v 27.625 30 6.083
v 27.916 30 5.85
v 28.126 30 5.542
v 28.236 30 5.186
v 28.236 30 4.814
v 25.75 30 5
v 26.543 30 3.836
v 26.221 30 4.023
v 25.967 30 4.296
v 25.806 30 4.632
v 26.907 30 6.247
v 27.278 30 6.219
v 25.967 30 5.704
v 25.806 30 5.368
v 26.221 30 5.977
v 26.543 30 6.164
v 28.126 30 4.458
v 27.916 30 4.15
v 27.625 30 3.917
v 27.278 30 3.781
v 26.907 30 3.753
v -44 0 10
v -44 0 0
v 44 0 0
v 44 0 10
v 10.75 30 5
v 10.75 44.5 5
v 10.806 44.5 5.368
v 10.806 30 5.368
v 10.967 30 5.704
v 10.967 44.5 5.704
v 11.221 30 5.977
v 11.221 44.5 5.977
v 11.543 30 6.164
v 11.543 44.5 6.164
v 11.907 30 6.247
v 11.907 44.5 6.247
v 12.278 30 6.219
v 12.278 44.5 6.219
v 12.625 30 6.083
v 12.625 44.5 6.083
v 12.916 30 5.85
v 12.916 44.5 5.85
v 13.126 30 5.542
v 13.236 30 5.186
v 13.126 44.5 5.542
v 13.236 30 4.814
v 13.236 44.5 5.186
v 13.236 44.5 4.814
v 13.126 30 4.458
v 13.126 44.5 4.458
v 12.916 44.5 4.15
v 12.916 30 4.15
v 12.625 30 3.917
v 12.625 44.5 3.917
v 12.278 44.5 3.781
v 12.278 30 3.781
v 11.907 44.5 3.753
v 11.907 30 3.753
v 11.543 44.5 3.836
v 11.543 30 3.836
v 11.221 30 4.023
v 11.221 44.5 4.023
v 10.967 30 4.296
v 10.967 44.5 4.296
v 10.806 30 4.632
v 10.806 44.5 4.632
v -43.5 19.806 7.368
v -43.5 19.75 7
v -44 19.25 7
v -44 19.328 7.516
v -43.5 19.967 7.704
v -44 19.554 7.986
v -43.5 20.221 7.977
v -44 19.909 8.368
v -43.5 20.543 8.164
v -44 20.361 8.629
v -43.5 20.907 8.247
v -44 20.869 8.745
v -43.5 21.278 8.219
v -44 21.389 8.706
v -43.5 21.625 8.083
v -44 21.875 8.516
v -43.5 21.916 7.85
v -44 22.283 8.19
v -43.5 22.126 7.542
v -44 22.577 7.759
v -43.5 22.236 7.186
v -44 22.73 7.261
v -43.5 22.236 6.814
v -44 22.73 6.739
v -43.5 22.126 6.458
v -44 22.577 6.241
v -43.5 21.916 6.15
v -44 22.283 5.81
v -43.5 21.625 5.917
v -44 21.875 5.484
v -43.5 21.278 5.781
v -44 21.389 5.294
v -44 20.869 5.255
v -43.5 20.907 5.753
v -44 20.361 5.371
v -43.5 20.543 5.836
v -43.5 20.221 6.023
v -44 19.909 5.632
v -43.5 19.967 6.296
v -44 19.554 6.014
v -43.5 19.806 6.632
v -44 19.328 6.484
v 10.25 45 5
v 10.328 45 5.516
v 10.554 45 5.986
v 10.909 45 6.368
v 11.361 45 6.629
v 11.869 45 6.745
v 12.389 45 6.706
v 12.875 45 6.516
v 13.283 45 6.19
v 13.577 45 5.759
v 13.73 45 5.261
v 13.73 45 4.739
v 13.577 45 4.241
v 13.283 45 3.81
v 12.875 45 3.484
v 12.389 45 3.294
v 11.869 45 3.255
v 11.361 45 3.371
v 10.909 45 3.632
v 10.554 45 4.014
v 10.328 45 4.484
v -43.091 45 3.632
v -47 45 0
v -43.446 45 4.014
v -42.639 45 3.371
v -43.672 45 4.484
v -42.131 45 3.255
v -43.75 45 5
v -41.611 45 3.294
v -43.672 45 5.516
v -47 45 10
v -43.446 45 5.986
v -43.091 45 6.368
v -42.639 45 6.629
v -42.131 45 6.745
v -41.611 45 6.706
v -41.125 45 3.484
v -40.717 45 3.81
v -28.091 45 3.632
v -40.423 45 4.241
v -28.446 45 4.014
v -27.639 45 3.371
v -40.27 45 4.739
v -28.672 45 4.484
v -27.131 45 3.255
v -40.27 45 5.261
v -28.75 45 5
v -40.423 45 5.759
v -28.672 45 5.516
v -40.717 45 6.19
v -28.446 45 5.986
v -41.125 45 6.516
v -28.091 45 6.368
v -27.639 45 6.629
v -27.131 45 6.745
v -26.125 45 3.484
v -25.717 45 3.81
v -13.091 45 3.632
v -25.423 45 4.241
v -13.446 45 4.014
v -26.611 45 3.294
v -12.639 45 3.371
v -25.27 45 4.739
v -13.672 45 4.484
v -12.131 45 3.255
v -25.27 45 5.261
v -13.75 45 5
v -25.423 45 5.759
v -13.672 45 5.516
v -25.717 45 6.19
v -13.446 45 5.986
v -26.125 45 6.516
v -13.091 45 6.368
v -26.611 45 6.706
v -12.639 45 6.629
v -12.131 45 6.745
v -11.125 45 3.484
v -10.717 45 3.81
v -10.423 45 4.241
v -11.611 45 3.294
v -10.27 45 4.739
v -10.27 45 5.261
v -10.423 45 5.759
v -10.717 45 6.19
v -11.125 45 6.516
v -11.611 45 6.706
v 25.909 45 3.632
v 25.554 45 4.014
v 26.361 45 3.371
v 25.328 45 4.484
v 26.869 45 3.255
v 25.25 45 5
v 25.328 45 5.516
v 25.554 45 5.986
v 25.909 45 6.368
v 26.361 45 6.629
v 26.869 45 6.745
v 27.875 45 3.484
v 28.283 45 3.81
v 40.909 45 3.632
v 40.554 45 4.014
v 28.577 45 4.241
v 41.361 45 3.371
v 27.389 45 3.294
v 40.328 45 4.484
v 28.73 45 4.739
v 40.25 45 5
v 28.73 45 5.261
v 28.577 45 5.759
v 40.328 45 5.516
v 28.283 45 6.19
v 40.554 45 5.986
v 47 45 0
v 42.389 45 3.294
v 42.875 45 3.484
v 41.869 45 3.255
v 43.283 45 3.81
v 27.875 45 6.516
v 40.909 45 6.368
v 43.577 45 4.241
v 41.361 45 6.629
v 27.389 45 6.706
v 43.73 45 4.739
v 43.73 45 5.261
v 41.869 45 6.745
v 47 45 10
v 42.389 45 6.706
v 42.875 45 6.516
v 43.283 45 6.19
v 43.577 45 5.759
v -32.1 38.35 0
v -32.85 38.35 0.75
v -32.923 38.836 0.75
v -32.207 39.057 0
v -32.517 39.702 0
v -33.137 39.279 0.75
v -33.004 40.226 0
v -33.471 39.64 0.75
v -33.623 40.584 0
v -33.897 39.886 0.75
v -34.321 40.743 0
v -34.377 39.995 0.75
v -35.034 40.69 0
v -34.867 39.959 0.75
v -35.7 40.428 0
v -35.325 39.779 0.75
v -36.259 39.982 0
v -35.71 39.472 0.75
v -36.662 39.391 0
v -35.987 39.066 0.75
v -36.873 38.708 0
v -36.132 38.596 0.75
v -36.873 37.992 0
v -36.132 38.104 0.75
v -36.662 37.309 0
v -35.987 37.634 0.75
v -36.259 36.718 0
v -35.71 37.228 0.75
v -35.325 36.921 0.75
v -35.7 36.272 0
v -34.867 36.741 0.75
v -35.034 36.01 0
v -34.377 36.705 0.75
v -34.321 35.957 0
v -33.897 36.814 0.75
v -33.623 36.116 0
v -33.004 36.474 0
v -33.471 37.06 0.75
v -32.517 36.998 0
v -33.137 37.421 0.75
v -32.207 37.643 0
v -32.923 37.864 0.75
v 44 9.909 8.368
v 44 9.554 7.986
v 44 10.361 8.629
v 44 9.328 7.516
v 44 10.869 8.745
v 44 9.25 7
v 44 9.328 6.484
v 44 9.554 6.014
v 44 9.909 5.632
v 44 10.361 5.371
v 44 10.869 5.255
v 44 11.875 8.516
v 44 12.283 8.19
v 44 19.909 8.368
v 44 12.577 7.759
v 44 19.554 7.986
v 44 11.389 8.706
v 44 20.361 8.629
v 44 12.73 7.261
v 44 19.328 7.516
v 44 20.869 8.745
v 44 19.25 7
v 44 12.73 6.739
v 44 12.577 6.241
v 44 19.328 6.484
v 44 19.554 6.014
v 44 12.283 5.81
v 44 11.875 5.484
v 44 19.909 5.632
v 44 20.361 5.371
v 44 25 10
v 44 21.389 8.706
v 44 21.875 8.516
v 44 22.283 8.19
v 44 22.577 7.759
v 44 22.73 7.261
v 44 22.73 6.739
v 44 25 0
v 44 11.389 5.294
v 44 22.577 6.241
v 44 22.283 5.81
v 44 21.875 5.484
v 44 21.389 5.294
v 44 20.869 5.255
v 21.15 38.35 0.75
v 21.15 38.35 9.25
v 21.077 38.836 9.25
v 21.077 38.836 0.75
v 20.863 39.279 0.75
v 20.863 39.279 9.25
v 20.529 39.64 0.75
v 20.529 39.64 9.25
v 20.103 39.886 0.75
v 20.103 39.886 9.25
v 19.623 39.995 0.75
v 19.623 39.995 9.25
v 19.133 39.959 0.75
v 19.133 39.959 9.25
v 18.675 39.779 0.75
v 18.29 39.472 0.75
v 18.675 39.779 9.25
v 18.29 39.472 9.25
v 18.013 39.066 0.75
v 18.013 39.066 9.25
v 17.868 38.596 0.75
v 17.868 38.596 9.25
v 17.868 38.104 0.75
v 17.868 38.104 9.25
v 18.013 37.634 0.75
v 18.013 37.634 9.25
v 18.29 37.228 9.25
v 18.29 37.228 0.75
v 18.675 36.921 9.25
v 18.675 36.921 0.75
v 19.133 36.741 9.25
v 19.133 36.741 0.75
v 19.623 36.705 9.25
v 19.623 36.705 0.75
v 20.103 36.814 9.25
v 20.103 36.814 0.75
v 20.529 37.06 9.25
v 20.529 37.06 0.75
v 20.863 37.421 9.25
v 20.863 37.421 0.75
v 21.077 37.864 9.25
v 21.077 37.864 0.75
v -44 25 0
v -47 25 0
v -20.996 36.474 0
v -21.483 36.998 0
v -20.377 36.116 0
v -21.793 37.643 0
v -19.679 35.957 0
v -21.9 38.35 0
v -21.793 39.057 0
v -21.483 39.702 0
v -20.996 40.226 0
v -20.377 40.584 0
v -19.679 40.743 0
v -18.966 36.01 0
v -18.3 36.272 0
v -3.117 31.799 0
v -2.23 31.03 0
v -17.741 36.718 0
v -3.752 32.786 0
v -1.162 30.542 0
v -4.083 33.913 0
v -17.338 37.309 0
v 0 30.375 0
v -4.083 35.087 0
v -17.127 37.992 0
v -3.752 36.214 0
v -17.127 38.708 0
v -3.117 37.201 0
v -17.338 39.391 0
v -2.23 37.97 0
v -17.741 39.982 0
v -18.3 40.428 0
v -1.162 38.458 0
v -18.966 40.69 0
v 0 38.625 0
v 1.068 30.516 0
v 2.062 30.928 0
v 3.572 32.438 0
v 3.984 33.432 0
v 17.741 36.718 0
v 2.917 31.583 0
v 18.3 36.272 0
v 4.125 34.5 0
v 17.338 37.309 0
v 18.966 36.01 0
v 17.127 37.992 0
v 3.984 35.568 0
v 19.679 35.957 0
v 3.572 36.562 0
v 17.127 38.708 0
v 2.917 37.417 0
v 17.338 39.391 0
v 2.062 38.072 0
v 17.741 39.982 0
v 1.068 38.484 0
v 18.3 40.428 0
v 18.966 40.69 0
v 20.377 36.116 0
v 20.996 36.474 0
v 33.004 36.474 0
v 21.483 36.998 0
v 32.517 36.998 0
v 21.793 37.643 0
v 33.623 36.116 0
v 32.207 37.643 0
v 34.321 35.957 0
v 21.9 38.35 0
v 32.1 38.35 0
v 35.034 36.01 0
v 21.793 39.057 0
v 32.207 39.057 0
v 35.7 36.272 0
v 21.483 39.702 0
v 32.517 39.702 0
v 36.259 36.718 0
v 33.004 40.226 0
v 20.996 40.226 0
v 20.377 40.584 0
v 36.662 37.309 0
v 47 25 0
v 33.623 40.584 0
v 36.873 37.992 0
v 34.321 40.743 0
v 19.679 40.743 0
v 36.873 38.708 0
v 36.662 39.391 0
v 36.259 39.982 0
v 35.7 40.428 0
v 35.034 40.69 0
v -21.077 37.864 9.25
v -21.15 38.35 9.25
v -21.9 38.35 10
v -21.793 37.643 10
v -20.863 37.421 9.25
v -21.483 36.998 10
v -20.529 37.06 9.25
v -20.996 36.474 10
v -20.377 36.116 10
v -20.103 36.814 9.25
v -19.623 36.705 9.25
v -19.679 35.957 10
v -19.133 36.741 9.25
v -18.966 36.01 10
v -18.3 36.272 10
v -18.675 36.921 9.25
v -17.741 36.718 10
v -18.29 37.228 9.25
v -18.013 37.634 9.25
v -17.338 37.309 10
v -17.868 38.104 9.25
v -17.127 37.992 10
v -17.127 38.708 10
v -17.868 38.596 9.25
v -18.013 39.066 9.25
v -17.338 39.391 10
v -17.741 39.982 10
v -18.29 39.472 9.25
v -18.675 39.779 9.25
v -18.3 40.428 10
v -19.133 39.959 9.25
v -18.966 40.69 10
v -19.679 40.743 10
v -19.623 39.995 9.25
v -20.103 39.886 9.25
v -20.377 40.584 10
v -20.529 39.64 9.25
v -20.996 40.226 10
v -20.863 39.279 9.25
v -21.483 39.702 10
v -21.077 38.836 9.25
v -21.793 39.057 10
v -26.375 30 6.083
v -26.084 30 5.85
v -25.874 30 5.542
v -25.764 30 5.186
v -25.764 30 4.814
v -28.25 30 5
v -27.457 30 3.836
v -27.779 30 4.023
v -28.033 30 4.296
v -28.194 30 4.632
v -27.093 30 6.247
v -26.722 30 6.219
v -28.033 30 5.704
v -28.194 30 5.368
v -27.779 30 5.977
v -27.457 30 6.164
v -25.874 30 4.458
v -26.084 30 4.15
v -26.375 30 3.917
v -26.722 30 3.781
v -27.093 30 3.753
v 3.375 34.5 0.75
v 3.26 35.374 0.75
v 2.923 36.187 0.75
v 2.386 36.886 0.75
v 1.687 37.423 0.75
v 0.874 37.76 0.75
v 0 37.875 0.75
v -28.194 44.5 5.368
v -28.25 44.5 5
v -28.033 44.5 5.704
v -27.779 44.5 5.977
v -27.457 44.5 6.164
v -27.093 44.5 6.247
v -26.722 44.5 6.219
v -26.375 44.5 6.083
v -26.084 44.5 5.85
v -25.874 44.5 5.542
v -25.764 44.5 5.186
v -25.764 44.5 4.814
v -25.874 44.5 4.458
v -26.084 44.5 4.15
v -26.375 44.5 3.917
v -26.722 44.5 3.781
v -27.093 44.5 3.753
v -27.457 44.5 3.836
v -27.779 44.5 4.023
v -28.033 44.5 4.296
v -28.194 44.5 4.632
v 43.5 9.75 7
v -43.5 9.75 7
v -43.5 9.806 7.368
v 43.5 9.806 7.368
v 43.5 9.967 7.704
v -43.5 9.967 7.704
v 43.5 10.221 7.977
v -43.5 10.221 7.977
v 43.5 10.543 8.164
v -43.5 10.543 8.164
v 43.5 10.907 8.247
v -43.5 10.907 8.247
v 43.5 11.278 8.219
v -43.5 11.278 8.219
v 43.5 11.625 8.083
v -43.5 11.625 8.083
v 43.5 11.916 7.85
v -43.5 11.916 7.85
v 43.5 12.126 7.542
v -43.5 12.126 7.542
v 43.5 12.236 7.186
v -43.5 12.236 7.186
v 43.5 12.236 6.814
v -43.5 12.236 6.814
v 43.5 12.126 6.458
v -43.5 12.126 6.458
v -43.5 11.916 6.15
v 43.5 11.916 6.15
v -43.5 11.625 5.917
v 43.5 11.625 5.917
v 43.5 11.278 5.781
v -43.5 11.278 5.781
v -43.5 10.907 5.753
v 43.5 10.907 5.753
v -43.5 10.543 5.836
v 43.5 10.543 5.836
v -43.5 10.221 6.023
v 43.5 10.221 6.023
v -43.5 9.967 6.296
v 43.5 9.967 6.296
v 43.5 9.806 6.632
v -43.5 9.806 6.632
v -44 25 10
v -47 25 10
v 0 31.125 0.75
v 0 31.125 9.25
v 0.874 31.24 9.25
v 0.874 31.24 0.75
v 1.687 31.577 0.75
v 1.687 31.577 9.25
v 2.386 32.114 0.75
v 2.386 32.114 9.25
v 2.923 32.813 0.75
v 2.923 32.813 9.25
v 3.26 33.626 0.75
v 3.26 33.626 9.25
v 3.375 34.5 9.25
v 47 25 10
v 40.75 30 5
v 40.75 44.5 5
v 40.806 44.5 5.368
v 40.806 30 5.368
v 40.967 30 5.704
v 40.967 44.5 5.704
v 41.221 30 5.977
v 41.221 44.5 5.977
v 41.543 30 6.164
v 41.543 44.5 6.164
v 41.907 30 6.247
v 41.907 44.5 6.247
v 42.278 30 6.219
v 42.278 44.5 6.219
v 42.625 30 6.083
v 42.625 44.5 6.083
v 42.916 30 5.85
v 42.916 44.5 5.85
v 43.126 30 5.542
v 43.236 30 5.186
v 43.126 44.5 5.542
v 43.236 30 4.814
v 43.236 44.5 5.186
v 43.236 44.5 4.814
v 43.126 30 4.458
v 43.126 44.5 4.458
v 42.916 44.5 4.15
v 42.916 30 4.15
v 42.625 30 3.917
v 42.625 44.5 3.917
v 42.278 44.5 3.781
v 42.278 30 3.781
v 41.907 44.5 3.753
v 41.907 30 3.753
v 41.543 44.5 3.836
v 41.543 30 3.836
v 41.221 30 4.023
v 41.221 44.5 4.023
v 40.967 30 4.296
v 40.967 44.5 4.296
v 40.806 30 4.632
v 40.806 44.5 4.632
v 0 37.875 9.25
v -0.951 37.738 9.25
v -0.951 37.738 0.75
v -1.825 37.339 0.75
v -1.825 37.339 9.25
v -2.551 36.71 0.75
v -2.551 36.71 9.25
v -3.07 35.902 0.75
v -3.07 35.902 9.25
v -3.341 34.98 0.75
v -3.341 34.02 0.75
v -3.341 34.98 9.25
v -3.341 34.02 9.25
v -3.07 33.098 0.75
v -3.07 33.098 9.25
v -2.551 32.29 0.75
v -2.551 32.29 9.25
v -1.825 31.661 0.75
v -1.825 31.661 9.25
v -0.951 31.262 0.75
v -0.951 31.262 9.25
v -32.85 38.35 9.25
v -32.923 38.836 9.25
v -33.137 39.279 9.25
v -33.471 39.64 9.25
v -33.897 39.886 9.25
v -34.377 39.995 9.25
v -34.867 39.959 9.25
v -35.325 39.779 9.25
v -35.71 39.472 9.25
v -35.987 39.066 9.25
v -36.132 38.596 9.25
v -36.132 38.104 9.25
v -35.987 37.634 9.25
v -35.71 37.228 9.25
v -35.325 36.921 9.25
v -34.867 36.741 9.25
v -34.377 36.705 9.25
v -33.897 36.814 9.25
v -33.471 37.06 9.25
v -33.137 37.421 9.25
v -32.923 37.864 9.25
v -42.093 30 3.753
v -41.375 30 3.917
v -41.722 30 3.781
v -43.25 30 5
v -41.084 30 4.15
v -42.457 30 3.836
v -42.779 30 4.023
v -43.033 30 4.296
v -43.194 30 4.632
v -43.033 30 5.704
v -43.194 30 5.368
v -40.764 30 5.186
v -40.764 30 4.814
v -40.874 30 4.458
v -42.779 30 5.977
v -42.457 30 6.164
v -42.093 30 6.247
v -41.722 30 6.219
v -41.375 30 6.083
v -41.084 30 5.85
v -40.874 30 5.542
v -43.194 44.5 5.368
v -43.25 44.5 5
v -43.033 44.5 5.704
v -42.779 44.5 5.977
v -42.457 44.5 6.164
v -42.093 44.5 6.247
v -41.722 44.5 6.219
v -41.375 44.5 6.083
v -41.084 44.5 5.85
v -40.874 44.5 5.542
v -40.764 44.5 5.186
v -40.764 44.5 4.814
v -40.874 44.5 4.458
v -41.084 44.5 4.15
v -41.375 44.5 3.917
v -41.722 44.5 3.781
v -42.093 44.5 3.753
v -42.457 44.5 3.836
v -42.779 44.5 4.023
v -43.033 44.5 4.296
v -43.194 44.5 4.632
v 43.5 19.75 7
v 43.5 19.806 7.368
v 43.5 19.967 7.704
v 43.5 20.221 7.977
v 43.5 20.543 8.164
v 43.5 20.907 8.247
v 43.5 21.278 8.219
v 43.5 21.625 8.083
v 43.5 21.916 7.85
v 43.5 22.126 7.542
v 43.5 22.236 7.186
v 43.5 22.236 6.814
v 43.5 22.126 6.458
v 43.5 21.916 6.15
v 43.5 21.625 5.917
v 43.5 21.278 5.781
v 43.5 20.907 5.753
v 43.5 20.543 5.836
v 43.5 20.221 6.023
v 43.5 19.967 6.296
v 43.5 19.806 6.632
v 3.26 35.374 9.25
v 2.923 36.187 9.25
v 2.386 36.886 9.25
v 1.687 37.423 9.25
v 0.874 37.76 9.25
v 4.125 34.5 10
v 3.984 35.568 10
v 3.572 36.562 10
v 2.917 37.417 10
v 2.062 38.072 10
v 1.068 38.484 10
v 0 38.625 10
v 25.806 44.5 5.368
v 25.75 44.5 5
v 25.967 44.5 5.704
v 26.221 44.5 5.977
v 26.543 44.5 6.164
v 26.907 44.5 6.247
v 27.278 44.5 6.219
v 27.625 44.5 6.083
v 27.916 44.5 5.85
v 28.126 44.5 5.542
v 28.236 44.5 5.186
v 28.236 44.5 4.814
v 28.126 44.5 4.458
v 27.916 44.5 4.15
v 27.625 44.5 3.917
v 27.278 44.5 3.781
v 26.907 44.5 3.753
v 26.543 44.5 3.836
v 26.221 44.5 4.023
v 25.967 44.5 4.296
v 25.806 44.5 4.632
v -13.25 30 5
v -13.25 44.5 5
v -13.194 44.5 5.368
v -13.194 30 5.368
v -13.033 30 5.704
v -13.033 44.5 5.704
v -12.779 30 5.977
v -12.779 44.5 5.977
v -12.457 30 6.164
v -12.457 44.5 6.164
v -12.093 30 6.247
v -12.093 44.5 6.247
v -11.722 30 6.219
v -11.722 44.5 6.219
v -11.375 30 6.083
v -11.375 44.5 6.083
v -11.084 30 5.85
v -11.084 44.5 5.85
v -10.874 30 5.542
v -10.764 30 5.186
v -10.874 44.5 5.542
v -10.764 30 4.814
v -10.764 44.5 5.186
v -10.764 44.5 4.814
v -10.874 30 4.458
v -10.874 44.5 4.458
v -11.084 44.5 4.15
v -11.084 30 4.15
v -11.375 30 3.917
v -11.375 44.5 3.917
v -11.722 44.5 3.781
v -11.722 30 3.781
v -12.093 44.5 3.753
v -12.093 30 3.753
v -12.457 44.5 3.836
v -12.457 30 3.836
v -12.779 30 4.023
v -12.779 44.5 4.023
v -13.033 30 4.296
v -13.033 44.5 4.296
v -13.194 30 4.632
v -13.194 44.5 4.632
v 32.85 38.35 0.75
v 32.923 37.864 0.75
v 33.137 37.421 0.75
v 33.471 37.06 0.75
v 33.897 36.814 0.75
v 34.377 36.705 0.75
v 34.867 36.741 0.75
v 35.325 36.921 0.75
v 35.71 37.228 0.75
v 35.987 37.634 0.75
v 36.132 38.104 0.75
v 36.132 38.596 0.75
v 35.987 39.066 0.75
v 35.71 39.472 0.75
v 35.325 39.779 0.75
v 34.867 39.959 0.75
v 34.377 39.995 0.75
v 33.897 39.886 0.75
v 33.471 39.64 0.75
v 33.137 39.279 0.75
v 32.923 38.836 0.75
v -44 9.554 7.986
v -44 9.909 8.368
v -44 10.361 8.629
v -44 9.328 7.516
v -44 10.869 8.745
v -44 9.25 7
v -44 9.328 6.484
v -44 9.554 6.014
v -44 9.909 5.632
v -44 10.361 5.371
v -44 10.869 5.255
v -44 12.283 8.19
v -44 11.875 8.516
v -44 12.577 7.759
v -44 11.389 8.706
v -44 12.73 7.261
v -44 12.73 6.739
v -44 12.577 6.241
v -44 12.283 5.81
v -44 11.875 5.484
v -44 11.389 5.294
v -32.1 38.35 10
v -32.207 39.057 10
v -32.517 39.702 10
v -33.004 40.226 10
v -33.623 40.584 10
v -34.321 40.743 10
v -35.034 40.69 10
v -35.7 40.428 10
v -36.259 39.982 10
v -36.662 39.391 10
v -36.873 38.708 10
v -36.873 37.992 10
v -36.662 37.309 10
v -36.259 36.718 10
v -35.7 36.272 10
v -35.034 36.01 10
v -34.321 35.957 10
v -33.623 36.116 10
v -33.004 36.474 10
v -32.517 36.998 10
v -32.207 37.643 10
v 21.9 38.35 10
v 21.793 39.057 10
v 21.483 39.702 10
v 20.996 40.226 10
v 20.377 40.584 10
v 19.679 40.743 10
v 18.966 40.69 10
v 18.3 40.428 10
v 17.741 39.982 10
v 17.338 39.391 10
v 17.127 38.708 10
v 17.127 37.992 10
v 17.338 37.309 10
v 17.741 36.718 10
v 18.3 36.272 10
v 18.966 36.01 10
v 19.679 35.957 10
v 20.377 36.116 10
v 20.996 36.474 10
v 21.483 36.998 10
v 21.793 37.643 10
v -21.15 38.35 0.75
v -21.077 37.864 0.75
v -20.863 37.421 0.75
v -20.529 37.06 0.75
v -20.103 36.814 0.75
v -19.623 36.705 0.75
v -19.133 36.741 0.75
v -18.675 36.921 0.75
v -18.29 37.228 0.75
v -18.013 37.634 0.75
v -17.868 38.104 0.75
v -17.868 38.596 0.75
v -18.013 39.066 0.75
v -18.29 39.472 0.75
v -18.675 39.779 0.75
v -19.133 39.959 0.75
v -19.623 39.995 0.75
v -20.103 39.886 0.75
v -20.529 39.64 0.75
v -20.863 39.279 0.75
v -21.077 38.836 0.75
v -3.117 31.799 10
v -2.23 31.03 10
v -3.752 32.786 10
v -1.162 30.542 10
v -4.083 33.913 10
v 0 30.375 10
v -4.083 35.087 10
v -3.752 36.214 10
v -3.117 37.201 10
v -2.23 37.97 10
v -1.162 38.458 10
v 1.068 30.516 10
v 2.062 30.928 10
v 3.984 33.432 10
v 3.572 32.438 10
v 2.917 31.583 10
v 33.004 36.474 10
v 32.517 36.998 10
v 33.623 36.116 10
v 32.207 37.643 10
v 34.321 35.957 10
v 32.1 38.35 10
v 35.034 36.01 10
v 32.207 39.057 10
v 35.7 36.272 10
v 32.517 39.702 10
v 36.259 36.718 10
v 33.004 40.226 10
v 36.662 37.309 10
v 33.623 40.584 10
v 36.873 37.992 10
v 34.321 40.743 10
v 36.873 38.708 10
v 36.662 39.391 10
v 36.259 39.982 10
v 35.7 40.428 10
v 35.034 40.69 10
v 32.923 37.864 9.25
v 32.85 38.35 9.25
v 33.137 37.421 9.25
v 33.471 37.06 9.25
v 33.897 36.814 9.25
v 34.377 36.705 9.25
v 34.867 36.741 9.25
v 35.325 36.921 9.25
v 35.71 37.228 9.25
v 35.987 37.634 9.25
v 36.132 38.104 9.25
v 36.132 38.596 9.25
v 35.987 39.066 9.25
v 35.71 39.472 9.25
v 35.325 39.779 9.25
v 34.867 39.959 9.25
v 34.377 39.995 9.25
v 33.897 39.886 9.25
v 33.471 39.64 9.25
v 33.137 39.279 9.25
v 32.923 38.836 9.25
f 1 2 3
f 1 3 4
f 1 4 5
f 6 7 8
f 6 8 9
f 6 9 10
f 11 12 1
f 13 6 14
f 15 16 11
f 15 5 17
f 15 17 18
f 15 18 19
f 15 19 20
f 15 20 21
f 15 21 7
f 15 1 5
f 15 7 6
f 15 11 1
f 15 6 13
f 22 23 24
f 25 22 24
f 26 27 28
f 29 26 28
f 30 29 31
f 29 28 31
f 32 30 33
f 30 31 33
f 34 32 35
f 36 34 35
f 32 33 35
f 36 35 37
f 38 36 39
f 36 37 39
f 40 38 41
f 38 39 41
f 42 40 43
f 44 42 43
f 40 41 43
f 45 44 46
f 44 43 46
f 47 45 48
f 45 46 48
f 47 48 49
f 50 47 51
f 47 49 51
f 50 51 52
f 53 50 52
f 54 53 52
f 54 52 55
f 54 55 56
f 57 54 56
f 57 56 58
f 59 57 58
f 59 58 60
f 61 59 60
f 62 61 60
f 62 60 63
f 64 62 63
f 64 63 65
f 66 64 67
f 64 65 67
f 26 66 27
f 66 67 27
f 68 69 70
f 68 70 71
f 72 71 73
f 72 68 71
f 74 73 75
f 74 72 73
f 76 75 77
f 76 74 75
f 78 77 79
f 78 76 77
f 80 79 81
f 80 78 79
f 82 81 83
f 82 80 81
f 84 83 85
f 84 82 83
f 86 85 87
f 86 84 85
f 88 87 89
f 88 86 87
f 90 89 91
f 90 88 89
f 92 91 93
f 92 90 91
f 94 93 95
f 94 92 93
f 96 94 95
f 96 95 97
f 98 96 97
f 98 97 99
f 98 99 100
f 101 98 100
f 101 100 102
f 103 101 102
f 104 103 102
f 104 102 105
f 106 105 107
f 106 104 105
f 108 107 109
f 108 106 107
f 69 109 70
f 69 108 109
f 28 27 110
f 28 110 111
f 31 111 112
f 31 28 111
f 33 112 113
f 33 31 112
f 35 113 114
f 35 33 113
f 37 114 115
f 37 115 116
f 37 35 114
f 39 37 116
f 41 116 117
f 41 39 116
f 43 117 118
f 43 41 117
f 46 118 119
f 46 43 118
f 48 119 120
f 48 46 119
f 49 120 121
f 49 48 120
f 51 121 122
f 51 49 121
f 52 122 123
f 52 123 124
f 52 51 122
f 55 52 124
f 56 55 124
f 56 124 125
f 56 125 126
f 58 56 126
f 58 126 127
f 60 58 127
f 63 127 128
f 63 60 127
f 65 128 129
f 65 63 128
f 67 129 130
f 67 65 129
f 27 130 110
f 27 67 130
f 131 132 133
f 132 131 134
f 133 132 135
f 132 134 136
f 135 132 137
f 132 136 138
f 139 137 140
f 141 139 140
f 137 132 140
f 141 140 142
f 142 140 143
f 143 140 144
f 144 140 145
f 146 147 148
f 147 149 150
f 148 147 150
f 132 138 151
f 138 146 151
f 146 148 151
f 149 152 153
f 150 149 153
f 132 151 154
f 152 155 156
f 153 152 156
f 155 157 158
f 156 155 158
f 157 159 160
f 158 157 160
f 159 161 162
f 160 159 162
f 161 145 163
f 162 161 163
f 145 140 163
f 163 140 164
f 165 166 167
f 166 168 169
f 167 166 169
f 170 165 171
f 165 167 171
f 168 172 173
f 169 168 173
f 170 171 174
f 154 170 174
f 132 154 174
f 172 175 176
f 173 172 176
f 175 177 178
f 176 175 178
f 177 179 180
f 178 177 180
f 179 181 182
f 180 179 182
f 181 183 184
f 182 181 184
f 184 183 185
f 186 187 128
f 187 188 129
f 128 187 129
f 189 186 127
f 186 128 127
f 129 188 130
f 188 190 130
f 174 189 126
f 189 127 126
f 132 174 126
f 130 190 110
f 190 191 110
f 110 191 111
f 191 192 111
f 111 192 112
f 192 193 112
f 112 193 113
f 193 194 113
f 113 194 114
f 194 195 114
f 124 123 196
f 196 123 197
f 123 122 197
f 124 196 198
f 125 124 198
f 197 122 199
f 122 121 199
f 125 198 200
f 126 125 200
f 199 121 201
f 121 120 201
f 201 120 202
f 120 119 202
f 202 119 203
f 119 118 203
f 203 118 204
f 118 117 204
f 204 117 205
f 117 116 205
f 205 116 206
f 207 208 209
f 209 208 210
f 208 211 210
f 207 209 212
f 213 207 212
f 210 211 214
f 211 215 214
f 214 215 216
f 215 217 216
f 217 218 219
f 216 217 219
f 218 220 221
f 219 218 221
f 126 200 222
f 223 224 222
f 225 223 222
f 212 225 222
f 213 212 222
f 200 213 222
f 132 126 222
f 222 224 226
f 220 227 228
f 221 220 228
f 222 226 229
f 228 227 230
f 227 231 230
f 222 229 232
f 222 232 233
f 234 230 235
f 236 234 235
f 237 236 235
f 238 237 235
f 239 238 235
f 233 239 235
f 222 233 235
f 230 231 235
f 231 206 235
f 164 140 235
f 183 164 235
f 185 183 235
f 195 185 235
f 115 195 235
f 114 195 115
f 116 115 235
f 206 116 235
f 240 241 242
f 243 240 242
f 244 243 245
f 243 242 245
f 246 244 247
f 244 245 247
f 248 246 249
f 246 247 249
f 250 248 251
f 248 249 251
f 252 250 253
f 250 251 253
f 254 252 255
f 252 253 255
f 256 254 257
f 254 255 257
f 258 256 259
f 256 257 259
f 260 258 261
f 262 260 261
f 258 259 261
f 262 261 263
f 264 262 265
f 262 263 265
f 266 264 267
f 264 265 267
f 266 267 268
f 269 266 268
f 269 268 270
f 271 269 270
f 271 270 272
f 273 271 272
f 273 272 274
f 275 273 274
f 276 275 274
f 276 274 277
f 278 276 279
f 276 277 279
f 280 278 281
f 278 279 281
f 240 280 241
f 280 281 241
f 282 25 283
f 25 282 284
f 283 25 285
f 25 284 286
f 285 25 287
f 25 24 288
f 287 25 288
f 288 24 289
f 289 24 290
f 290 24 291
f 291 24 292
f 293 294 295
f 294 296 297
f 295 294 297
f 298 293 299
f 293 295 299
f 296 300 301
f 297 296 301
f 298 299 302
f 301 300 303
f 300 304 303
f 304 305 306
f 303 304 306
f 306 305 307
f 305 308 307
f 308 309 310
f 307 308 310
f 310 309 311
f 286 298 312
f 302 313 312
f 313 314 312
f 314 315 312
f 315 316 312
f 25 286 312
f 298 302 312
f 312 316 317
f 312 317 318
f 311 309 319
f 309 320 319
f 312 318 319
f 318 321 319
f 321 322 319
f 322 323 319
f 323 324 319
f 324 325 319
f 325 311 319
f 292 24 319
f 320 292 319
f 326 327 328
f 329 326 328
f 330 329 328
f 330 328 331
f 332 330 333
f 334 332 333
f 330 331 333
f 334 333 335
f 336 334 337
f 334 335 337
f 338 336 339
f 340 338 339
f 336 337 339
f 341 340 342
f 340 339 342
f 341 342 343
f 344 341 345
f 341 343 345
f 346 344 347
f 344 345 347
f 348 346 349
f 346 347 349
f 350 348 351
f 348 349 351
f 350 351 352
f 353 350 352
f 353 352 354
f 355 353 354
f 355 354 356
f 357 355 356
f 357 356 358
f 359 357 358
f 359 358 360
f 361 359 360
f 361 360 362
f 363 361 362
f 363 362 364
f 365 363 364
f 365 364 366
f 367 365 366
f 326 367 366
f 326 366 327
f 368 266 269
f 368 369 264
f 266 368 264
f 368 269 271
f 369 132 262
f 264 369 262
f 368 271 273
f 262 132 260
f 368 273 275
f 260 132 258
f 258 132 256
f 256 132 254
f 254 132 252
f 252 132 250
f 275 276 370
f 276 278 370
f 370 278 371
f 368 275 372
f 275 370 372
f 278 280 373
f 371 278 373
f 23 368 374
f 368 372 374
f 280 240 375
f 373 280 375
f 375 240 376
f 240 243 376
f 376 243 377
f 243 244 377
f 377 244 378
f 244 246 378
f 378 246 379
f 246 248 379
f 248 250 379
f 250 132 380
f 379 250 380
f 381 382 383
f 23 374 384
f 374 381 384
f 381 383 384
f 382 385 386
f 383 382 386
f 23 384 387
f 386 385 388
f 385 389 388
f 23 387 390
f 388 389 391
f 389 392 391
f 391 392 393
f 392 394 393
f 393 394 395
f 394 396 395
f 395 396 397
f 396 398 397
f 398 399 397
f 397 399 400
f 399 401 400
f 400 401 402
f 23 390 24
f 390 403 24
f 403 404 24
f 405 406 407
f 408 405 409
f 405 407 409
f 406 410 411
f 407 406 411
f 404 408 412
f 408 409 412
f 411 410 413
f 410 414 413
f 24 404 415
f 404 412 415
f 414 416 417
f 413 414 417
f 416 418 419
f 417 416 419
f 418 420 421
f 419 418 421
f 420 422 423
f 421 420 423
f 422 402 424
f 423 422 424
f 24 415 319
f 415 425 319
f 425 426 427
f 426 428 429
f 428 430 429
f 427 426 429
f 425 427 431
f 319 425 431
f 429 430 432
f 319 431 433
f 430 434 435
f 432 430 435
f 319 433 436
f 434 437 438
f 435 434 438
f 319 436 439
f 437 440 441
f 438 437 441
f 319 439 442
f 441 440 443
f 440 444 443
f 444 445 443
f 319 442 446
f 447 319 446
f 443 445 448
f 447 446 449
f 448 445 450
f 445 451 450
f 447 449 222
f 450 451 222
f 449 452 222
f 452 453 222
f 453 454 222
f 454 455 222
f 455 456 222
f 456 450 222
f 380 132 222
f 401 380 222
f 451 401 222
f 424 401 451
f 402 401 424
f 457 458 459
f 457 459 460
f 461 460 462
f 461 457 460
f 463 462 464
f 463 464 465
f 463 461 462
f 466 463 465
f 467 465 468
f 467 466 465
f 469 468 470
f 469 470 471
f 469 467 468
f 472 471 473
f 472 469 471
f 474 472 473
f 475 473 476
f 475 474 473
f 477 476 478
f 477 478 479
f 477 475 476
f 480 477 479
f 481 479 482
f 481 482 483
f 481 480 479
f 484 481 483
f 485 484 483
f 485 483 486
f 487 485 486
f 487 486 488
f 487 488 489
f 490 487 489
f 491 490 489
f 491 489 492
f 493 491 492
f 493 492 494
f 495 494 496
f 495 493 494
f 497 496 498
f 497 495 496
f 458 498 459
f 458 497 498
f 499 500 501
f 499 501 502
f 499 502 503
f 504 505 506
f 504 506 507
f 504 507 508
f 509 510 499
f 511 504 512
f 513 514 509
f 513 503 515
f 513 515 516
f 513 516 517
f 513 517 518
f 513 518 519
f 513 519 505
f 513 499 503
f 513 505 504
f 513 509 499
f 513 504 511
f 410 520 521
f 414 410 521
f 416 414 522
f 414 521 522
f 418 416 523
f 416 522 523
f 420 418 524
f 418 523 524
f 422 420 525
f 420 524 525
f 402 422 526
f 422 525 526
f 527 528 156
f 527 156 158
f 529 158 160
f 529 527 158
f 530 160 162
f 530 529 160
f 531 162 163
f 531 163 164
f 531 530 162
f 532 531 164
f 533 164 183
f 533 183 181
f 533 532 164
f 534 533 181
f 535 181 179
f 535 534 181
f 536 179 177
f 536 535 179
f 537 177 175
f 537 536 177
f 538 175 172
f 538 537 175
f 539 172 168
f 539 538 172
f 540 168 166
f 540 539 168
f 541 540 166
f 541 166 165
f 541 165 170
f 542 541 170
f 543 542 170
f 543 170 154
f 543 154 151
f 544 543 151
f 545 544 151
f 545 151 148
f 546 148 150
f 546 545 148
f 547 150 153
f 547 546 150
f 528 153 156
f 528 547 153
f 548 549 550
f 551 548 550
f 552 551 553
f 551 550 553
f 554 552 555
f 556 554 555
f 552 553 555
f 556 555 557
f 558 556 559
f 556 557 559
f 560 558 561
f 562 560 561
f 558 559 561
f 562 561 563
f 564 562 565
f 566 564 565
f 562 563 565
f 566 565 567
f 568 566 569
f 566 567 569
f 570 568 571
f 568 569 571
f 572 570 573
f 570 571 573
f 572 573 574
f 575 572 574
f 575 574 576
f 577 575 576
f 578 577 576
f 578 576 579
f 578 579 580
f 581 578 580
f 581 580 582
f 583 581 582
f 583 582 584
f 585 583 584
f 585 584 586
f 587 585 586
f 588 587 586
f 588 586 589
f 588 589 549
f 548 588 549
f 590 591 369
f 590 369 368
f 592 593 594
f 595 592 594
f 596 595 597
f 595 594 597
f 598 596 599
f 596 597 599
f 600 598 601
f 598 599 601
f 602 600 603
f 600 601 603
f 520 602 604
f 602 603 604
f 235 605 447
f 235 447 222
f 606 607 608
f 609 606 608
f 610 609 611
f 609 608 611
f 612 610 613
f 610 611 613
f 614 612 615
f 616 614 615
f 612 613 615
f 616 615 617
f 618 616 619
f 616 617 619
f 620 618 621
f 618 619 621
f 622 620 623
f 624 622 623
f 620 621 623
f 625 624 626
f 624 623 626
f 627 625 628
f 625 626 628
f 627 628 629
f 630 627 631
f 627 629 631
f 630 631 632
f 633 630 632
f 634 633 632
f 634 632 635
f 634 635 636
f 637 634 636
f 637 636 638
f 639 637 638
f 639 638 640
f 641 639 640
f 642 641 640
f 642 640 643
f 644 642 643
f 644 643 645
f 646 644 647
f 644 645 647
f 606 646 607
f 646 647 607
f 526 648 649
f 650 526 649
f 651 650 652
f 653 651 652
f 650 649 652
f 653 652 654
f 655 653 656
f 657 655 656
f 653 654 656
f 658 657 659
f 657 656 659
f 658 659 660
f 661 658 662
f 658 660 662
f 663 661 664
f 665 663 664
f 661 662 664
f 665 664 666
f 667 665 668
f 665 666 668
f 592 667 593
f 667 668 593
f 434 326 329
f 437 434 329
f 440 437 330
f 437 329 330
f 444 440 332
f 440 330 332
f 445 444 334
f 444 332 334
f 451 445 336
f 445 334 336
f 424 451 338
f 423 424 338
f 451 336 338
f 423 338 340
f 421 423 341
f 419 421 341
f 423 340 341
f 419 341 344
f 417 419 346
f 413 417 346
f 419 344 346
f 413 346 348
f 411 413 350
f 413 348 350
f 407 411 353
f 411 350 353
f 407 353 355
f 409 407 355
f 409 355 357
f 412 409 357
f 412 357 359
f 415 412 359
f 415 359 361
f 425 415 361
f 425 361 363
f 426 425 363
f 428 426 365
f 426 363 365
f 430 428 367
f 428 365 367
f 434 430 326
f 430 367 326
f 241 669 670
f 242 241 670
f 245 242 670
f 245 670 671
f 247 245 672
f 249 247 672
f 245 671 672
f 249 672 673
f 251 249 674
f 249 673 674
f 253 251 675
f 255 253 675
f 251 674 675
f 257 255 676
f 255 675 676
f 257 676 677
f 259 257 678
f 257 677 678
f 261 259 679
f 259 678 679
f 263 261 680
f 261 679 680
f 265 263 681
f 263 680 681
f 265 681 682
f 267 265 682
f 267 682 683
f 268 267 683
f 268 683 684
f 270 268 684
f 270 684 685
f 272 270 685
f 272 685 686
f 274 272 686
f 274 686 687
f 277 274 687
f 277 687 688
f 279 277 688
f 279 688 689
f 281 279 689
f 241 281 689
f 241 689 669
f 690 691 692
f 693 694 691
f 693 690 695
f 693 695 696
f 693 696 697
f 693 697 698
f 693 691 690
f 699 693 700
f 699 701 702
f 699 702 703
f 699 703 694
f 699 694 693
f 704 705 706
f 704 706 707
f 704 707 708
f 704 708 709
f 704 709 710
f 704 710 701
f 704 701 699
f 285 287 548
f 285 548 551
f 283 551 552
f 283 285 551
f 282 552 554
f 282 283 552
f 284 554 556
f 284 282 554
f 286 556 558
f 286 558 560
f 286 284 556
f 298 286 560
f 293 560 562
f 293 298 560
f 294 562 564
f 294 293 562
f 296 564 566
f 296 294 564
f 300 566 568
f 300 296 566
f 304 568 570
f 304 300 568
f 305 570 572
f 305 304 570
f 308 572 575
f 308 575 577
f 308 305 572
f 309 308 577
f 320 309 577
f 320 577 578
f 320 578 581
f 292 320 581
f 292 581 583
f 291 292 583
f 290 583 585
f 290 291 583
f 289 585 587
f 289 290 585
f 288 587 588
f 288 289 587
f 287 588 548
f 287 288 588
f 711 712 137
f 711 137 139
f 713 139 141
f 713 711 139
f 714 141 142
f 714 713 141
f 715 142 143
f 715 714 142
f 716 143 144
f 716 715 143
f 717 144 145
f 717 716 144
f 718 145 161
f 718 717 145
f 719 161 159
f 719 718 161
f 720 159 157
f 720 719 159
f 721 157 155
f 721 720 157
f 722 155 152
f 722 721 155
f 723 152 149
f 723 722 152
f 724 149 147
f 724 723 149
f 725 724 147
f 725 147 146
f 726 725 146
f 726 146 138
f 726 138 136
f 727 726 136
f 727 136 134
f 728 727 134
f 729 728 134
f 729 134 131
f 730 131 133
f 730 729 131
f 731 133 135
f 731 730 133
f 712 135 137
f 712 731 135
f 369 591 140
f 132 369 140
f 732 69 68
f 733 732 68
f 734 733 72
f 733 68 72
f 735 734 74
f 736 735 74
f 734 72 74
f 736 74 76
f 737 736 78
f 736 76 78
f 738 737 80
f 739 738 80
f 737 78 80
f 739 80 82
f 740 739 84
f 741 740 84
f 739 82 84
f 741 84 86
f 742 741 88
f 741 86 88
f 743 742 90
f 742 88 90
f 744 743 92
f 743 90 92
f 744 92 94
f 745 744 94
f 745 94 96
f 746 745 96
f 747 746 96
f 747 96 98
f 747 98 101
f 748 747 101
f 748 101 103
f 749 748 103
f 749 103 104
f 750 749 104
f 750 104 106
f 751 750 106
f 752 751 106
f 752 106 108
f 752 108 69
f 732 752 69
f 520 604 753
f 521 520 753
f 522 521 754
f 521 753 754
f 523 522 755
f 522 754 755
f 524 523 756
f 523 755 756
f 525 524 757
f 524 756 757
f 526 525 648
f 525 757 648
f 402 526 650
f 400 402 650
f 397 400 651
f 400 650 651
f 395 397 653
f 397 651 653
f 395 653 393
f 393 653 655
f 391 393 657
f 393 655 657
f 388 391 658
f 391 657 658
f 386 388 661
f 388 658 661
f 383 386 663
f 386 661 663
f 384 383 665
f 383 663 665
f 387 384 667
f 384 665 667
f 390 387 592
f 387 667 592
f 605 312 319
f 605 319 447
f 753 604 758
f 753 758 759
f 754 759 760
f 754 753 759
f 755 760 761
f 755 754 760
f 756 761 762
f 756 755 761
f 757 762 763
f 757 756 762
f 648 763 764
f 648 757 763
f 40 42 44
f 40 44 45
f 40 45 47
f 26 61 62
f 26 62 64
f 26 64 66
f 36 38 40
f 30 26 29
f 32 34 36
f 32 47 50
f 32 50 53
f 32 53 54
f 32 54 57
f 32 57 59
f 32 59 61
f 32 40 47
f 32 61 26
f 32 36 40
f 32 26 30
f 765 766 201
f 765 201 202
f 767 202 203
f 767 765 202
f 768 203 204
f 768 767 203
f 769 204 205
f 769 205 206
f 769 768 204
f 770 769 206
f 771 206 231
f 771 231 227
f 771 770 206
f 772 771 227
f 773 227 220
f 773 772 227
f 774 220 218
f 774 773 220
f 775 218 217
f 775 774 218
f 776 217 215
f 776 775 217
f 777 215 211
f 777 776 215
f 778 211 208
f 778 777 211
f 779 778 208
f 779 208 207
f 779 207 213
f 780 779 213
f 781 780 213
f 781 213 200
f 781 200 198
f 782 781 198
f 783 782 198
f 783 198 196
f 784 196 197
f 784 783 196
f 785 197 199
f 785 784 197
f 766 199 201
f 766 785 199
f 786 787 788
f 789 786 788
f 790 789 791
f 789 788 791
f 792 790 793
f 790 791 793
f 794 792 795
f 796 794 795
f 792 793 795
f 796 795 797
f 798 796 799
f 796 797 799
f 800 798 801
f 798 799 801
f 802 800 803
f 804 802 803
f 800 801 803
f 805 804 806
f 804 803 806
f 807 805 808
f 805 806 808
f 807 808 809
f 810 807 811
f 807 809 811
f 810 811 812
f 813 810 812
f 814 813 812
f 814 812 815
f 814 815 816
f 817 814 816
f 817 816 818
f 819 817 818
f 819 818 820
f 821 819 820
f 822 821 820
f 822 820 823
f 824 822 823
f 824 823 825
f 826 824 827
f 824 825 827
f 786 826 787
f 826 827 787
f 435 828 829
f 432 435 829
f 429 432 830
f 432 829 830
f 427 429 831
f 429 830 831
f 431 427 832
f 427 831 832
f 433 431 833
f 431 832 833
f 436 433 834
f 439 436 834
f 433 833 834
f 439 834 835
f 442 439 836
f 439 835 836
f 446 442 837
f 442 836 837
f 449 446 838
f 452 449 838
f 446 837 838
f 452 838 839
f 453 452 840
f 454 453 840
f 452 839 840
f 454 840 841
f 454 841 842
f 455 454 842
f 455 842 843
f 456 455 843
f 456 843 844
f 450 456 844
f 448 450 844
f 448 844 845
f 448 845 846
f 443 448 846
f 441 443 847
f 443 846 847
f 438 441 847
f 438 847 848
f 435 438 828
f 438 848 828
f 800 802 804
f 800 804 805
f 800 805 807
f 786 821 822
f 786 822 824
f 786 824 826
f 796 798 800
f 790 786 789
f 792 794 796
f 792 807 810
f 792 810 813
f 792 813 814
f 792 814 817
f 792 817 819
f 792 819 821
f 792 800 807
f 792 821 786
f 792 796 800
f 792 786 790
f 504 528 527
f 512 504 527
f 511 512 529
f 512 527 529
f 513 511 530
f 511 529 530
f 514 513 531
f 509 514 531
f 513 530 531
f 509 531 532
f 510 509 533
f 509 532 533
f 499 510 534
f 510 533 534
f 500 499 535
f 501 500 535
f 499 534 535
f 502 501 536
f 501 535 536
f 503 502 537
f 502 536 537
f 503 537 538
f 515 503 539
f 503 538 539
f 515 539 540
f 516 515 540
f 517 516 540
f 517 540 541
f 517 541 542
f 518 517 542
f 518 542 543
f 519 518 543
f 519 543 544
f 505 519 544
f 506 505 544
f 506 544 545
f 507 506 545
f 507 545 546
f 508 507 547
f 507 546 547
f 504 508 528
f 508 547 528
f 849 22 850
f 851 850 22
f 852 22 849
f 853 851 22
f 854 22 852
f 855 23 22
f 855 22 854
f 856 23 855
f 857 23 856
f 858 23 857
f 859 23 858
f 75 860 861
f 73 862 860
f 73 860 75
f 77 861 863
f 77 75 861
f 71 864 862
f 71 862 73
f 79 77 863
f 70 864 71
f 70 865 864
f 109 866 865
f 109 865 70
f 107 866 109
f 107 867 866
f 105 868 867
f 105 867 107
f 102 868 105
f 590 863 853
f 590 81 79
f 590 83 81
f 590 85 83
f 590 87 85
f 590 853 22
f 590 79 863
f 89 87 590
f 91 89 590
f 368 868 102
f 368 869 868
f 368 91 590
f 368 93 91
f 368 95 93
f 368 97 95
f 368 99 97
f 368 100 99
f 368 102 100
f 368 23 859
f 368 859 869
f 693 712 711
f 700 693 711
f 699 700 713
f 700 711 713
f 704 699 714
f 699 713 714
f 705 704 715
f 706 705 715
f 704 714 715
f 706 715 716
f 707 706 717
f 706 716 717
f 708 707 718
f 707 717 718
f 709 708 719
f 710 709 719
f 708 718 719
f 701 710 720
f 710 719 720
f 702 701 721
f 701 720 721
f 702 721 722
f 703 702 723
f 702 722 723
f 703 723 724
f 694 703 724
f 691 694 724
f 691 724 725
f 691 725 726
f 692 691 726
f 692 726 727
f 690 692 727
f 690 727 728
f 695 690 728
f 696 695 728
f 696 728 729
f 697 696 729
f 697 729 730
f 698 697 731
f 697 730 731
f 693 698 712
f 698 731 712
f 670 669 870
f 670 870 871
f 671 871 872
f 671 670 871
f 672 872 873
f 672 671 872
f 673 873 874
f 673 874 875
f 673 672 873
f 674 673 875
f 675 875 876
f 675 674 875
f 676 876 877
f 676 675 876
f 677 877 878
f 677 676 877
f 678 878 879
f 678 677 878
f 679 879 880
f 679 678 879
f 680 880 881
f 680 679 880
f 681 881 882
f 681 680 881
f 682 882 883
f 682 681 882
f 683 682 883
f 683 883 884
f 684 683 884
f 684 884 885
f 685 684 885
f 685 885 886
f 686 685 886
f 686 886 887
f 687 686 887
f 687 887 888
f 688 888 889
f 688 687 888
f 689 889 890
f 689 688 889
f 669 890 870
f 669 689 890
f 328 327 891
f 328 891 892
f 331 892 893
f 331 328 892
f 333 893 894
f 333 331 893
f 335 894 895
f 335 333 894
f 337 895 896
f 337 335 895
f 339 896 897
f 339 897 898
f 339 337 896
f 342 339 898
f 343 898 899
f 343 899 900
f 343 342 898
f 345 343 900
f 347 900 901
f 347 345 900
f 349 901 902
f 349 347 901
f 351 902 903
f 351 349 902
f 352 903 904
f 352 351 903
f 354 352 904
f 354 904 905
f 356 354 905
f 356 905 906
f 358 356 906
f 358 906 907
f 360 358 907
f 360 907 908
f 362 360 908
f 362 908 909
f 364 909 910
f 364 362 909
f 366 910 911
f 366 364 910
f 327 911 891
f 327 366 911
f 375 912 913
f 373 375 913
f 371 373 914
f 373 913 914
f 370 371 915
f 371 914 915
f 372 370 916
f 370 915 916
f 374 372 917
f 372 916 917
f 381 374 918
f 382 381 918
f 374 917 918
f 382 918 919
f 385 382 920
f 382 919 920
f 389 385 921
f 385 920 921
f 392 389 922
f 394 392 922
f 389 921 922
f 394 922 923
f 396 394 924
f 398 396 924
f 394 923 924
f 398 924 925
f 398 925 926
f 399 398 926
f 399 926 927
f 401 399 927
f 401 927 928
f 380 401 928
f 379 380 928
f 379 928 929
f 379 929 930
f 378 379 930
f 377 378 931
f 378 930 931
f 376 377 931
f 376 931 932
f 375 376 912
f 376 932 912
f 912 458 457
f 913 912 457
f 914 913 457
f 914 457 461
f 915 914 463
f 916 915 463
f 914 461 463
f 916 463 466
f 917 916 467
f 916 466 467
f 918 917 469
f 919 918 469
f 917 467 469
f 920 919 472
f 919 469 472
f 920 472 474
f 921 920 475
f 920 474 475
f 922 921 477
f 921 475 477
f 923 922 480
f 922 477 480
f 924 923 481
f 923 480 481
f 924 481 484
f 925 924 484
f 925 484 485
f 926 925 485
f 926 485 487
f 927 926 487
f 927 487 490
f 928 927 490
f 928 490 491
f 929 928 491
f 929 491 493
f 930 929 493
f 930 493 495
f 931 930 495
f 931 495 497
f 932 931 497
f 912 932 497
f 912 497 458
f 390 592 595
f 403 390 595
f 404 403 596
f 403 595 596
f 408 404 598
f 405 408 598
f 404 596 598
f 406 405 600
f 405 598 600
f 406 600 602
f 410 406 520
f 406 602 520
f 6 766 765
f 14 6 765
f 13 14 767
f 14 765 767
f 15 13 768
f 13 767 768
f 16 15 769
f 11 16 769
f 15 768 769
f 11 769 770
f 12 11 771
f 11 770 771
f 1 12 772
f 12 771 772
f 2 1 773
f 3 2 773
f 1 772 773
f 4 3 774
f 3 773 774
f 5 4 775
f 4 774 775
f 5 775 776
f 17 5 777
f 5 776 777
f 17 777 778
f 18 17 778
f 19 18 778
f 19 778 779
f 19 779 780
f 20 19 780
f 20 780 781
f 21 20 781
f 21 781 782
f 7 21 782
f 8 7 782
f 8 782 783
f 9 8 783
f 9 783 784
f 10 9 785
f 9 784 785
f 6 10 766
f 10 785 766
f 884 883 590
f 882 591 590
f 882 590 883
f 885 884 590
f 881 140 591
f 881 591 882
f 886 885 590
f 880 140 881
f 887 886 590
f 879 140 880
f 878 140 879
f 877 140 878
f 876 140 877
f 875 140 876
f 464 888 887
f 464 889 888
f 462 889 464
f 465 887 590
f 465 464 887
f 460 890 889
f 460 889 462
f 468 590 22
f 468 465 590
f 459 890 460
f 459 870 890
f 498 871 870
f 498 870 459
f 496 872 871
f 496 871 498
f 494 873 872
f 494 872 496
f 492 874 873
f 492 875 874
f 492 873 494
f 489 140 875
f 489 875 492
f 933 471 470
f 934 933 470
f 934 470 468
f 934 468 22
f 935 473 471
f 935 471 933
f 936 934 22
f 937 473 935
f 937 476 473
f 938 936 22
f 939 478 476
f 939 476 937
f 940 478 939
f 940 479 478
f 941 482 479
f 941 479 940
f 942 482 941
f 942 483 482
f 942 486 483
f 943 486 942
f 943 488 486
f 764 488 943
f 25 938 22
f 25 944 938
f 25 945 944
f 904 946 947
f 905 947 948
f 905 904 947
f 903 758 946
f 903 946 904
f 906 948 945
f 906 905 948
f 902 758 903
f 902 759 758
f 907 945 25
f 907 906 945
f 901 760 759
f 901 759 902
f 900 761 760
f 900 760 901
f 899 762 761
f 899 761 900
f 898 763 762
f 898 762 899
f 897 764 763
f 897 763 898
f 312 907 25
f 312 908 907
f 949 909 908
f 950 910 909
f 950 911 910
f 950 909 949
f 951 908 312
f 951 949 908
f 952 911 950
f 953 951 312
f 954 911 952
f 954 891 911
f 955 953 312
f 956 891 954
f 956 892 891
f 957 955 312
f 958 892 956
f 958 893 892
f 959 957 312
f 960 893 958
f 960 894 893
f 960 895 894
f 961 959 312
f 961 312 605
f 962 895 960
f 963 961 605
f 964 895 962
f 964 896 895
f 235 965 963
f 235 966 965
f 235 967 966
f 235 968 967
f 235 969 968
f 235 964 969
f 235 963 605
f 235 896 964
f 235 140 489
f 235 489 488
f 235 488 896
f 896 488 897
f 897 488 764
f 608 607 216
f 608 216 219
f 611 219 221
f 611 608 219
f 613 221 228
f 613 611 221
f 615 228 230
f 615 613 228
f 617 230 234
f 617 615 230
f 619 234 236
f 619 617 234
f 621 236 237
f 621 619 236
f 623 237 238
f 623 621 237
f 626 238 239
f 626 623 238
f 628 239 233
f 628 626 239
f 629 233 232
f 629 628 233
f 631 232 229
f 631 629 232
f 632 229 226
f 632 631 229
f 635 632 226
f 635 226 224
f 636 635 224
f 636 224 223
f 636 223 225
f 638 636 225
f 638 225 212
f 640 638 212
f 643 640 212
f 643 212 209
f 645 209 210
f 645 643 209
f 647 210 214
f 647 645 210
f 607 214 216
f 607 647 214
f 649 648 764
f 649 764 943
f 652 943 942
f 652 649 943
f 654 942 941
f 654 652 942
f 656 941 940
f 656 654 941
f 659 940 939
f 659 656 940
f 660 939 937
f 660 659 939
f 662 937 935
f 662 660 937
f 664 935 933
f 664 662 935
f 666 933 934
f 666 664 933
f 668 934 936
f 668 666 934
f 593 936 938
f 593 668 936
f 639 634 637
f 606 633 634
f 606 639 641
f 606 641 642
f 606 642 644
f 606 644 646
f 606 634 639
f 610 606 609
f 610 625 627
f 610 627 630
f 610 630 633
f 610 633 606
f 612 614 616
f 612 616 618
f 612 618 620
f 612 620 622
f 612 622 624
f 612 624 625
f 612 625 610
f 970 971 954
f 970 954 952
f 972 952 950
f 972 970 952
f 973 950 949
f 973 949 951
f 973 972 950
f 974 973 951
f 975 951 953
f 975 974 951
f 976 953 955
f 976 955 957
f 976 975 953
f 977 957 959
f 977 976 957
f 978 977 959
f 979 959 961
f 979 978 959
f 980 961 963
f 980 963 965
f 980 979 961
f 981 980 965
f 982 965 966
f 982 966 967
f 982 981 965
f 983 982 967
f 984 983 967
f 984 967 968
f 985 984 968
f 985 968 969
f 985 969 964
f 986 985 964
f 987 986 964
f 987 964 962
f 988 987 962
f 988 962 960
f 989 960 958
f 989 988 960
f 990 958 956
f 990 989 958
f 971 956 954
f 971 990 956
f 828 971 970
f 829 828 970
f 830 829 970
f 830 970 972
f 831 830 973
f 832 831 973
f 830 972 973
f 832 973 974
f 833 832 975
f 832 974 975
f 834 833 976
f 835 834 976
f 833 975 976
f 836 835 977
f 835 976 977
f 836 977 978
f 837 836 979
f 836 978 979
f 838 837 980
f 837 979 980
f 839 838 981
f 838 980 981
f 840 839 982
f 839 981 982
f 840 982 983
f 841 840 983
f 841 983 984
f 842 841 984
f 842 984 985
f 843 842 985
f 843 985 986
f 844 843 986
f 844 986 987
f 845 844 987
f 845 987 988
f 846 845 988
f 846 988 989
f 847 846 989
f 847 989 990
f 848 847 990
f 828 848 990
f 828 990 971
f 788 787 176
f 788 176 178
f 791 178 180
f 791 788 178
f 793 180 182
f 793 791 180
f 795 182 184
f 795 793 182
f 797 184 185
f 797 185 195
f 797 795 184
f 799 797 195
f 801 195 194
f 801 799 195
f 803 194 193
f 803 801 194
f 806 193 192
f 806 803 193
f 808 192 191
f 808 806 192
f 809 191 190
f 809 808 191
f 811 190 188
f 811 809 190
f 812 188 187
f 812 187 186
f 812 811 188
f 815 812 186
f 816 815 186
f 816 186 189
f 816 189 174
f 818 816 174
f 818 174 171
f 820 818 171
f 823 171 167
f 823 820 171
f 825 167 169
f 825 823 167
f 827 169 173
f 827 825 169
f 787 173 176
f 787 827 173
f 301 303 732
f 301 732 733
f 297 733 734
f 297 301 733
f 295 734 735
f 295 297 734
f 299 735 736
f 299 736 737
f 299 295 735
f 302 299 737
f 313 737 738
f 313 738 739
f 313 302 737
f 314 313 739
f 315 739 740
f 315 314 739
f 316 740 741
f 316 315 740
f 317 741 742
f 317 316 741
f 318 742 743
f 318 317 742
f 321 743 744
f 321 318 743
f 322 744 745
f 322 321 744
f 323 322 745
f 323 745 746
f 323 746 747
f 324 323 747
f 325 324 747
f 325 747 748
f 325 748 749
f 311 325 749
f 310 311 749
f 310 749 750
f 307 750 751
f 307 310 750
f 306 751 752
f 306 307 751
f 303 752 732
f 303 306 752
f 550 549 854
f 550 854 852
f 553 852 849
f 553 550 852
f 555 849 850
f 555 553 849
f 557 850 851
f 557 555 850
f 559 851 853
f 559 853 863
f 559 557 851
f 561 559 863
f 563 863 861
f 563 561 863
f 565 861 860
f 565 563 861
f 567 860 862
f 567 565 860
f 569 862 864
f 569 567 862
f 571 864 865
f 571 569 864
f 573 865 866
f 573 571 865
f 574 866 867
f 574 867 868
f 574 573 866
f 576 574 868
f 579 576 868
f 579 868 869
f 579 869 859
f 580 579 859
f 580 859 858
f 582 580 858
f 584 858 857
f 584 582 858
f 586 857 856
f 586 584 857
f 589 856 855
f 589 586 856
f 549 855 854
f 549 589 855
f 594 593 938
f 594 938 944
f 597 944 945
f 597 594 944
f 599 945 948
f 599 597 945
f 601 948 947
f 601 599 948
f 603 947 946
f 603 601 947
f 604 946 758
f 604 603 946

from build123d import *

# Parameters (mm, degrees)
F0_W      = 44
F0_H      = 45
F1_DEPTH  = 10
F2_R      = 1.25
F3_DEPTH  = 88.001
F4_SIZE   = 0.5
F5_W      = 3
F5_H      = 20
F6_DEPTH  = 10
F7_R      = 1.65
F8_DEPTH  = 10.001
F9_SIZE   = 0.75
F10_R     = 1.25
F11_DEPTH = 15
F12_SIZE  = 0.5


with BuildPart() as f1:
    # F0 (on Top) → F1 (new body)
    with BuildSketch(Plane.XY):
        with Locations((-22, 22.5)):
            Rectangle(F0_W, F0_H)
        with Locations((22, 22.5)):
            Rectangle(F0_W, F0_H)
    extrude(amount=F1_DEPTH)

    # F2 (on face) → F3 (cut, through all)
    with BuildSketch(Plane(origin=(-44, 0, 0), x_dir=(0, -1, 0), z_dir=(-1, 0, 0))):
        with Locations((-21, 7)):
            Circle(F2_R)
        with Locations((-11, 7)):
            Circle(F2_R)
    extrude(amount=-F3_DEPTH, mode=Mode.SUBTRACT)

    # F4
    f4_edges = [f1.edges().sort_by_distance(p)[0] for p in [
        (-44, 22.25, 7),
        (-44, 12.25, 7),
        (44, 12.25, 7),
        (44, 22.25, 7),
    ]]
    chamfer(f4_edges, length=F4_SIZE)

    # F5 (on face) → F6 (join, through all)
    with BuildSketch(Plane.XY.offset(10)):
        with Locations((-45.5, 35)):
            Rectangle(F5_W, F5_H)
        with Locations((45.5, 35)):
            Rectangle(F5_W, F5_H)
    extrude(amount=-F6_DEPTH)

    # F7 (on face) → F8 (cut, through all)
    with BuildSketch(Plane.XY.offset(10)):
        with BuildLine():
            Line((0, 31.125), (0, 37.875))
            ThreePointArc((0, 37.875), (-3.375, 34.5), (0, 31.125))
        make_face()
        with BuildLine():
            ThreePointArc((0, 31.125), (2.3864853865, 32.1135146135), (3.375, 34.5))
            ThreePointArc((3.375, 34.5), (2.3864853865, 36.8864853865), (0, 37.875))
            Line((0, 37.875), (0, 31.125))
        make_face()
        with Locations((-34.5, 38.35)):
            Circle(F7_R)
        with BuildLine():
            ThreePointArc((-17.85, 38.35), (-19.5, 40), (-21.15, 38.35))
            ThreePointArc((-21.15, 38.35), (-19.5, 36.7), (-17.85, 38.35))
        make_face()
        with Locations((19.5, 38.35)):
            Circle(F7_R)
        with BuildLine():
            ThreePointArc((36.15, 38.35), (34.5, 40), (32.85, 38.35))
            ThreePointArc((32.85, 38.35), (34.5, 36.7), (36.15, 38.35))
        make_face()
    extrude(amount=-F8_DEPTH, mode=Mode.SUBTRACT)

    # F9
    f9_edges = [f1.edges().sort_by_distance(p)[0] for p in [
        (0, 37.875, 10),
        (0, 37.875, 0),
        (-36.15, 38.35, 10),
        (-17.85, 38.35, 10),
        (17.85, 38.35, 10),
        (36.15, 38.35, 10),
        (36.15, 38.35, 0),
        (17.85, 38.35, 0),
        (-17.85, 38.35, 0),
        (-36.15, 38.35, 0),
    ]]
    chamfer(f9_edges, length=F9_SIZE)

    # F10 (on face) → F11 (cut)
    with BuildSketch(Plane(origin=(0, 45, 0), x_dir=(-1, 0, 0), z_dir=(0, 1, 0))):
        with Locations((-42, 4.9999999996)):
            Circle(F10_R)
        with Locations((42, 4.9999999996)):
            Circle(F10_R)
        with Locations((-27, 4.9999999996)):
            Circle(F10_R)
        with Locations((-12, 4.9999999996)):
            Circle(F10_R)
        with Locations((12, 4.9999999996)):
            Circle(F10_R)
        with Locations((27, 4.9999999996)):
            Circle(F10_R)
    extrude(amount=-F11_DEPTH, mode=Mode.SUBTRACT)

    # F12
    f12_edges = [f1.edges().sort_by_distance(p)[0] for p in [
        (43.25, 45, 5),
        (-40.75, 45, 5),
        (28.25, 45, 5),
        (13.25, 45, 5),
        (-10.75, 45, 5),
        (-25.75, 45, 5),
    ]]
    chamfer(f12_edges, length=F12_SIZE)


solid = f1.part
